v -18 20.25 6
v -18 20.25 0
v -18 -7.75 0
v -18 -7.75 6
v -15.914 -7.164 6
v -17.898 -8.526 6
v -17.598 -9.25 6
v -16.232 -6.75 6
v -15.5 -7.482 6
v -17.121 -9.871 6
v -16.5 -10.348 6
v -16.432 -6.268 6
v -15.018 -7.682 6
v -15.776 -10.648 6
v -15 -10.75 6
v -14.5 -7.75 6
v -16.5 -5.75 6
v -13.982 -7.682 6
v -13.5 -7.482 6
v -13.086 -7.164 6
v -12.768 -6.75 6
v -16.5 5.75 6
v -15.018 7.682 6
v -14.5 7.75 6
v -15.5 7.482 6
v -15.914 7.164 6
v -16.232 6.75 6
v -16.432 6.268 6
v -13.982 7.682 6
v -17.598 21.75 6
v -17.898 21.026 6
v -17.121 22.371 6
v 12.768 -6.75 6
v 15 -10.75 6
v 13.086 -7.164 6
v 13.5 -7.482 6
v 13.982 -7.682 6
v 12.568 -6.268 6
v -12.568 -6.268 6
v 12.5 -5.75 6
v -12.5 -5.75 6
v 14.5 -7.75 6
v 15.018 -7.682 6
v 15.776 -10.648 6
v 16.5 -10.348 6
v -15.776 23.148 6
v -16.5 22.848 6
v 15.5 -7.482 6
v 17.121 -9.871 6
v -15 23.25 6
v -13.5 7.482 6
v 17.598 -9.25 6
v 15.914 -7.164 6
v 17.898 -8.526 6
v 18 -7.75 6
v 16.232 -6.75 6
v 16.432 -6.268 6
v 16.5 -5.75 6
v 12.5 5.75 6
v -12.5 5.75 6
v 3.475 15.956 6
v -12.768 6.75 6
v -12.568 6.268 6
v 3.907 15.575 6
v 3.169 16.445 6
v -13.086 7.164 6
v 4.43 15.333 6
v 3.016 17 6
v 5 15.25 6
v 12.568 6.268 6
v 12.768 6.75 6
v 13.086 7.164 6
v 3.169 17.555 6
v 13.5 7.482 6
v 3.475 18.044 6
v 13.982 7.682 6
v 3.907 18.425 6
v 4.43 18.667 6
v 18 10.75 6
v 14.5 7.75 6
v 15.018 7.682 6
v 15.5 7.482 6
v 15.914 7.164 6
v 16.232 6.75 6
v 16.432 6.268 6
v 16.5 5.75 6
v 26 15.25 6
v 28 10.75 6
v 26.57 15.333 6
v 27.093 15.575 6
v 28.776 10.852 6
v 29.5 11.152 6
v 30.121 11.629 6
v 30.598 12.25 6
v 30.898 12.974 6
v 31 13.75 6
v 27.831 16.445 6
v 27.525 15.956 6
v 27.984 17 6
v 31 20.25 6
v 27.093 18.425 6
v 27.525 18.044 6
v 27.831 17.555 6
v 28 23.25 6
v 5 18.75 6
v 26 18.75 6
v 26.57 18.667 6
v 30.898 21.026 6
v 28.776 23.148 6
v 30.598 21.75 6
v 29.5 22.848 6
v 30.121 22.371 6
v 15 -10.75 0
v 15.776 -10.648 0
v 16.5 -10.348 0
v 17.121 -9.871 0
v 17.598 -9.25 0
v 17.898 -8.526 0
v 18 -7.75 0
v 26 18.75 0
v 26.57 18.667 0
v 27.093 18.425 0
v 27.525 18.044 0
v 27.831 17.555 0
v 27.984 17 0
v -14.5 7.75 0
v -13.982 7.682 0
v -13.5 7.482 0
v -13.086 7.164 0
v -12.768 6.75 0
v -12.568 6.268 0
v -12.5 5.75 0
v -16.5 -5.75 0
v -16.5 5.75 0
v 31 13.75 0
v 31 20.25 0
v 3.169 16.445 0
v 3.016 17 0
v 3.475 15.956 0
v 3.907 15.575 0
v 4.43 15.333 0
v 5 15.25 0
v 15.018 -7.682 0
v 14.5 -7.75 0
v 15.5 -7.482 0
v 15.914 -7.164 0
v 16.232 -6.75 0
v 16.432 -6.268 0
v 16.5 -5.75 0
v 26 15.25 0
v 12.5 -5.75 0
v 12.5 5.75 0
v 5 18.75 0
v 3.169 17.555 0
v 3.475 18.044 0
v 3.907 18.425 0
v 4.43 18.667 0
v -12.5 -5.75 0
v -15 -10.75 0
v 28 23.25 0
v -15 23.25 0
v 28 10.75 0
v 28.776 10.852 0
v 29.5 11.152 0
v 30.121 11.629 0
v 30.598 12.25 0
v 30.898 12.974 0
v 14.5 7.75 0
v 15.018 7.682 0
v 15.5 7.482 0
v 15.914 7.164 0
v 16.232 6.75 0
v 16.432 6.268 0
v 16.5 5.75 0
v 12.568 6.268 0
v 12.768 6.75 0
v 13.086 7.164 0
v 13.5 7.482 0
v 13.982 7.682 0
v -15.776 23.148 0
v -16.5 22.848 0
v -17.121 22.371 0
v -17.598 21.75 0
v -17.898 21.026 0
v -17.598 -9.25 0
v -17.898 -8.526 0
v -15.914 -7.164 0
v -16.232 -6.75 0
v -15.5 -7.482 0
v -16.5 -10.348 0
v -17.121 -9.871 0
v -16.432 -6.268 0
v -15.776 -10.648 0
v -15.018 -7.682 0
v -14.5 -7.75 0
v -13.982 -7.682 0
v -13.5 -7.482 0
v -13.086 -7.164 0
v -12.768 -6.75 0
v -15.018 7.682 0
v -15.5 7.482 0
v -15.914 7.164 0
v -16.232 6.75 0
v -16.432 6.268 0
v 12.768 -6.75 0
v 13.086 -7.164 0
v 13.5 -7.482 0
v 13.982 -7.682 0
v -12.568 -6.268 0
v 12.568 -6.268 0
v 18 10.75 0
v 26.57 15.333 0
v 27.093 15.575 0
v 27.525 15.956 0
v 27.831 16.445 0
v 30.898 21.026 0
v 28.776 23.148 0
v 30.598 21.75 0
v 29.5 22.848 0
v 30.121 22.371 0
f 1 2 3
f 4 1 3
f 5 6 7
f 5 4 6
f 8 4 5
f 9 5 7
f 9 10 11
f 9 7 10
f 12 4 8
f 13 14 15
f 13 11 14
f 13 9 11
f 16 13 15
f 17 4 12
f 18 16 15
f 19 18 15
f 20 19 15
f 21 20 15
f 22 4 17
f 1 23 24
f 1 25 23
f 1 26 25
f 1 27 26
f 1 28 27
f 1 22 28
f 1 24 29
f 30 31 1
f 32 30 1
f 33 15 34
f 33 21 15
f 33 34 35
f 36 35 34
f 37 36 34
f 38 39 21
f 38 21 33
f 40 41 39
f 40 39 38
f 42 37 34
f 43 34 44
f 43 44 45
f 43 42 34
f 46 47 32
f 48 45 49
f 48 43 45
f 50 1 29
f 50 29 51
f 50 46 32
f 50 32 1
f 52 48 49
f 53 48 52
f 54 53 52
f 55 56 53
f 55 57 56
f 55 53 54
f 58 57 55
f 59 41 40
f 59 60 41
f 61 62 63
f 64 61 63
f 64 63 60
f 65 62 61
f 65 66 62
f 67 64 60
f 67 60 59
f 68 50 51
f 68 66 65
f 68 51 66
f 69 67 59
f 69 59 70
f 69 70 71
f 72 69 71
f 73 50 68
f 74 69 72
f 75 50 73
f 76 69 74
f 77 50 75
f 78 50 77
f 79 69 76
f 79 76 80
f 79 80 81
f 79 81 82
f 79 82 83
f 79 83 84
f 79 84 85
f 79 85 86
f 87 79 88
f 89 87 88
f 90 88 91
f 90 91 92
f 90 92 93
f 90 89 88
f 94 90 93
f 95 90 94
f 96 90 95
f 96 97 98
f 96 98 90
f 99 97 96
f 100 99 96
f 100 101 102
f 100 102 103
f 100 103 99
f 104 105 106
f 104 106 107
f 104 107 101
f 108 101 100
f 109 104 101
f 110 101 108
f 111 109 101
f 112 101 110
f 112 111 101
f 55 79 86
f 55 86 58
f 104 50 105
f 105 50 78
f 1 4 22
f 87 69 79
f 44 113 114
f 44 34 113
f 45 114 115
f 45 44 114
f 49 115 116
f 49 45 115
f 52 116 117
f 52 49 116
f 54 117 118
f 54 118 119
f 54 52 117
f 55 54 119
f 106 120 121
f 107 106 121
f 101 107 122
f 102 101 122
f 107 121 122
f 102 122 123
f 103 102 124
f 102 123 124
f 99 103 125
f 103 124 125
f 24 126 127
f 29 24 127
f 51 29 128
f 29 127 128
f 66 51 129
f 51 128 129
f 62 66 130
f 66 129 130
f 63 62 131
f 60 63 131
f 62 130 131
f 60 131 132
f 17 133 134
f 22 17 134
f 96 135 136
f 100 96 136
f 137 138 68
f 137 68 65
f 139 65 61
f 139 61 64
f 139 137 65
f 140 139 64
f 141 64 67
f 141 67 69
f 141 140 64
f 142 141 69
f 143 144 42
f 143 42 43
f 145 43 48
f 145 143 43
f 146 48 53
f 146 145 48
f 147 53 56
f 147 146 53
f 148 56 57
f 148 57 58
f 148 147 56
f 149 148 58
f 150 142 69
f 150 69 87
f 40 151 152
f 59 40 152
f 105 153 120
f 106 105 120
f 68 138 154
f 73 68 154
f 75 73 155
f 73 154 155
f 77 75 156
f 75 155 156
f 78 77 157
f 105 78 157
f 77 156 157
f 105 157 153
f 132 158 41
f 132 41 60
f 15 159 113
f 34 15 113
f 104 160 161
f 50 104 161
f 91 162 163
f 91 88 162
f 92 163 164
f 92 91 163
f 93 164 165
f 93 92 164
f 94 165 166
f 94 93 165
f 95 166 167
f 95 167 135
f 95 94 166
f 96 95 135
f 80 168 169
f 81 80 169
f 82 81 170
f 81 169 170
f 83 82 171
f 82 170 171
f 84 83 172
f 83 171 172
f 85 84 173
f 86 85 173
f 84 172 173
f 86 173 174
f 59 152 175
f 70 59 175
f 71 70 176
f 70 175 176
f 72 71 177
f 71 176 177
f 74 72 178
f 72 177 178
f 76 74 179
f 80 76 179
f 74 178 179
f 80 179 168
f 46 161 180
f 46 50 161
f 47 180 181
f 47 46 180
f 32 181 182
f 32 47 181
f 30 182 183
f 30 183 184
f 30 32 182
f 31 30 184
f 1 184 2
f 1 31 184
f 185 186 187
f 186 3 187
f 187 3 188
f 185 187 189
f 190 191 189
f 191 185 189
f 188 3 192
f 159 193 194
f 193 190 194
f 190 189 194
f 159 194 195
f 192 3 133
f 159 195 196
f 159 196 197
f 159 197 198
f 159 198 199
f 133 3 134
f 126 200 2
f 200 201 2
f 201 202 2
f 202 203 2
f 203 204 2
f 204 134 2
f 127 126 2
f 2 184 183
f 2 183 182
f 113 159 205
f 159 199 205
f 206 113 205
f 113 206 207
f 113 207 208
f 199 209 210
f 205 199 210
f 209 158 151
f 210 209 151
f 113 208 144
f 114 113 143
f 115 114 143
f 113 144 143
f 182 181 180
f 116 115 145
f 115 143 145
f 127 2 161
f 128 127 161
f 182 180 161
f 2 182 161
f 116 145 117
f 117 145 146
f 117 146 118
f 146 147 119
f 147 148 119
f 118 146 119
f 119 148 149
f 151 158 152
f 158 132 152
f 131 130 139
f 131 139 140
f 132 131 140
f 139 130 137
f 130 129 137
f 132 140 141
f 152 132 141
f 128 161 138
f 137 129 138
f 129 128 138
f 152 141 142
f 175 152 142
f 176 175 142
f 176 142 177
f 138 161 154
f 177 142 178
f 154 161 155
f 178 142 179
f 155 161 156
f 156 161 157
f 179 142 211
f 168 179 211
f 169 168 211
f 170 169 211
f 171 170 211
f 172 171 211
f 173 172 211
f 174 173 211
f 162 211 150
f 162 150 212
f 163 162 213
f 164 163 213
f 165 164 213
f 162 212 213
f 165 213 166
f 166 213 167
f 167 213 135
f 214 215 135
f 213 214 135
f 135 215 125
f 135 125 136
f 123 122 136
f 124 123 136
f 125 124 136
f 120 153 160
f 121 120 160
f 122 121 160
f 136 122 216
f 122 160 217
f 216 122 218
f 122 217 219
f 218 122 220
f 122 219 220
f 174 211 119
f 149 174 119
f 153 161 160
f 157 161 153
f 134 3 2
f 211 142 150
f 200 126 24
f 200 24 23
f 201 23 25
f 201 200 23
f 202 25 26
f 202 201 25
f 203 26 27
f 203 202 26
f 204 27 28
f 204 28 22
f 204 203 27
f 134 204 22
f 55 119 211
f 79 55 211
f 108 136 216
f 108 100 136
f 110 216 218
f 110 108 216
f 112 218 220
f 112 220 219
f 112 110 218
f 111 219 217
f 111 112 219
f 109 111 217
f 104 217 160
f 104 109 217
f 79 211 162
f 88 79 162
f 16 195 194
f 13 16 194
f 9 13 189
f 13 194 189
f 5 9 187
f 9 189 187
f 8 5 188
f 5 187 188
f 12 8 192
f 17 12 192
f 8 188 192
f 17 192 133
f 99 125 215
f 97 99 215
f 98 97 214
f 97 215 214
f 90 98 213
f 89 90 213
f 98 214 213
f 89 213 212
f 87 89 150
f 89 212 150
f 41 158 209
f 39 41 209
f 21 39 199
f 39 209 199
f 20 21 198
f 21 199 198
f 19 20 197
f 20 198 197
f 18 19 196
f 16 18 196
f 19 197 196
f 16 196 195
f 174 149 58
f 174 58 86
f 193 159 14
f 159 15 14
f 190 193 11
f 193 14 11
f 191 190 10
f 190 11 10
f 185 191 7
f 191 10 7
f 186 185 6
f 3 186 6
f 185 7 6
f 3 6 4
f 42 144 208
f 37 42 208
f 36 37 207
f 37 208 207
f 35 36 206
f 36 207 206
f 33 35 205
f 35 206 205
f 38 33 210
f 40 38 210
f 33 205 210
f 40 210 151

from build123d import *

# Parameters (mm, degrees)
F0_W        = 36
F0_H        = 21.5
F0_R        = 1.625
F0_W_2      = 4
F0_H_2      = 15.5
F0_W_3      = 25
F0_H_3      = 3.5
F1_DEPTH    = 6
F2_T1_DEPTH = 6
F3_R        = 3


# Not quite as in the source:
# - a fillet or chamfer that OpenCascade refuses, or shapes differently, is made with other operations: its cross-section is extruded or revolved along the edge and cut away or added


with BuildPart() as f1:
    # F0 (on Top) → F1 (new body)
    with BuildSketch(Plane.XY):
        Rectangle(F0_W, F0_H)
        with Locations((-4.0289468229, -6.686462095)):
            Circle(F0_R, mode=Mode.SUBTRACT)
        with Locations((4.0289468229, -6.686462095)):
            Circle(F0_R, mode=Mode.SUBTRACT)
        with Locations((-14.5, 0)):
            Rectangle(F0_W_2, F0_H_2, mode=Mode.SUBTRACT)
        with Locations((14.5, 0)):
            Rectangle(F0_W_2, F0_H_2, mode=Mode.SUBTRACT)
        Polygon((-18, 10.75), (18, 10.75), (31, 10.75), (31, 23.25), (-18, 23.25), align=None)
        with Locations((15.5, 17)):
            Rectangle(F0_W_3, F0_H_3, mode=Mode.SUBTRACT)
        with Locations((-4.0289468229, -6.686462095)):
            Circle(F0_R)
        with Locations((4.0289468229, -6.686462095)):
            Circle(F0_R)
    extrude(amount=F1_DEPTH)

    # F2: fillet of radius 2 on 12 edges, made by hand

    # F2_s2 → F2_t1 (join)
    with BuildSketch(Plane.XY):
        with BuildLine():
            ThreePointArc((3, 16.75), (3.5857864376, 18.1642135624), (5, 18.75))
            Line((5, 18.75), (3, 18.75))
            Line((3, 18.75), (3, 16.75))
        make_face()
        with BuildLine():
            ThreePointArc((26, 18.75), (27.4142135624, 18.1642135624), (28, 16.75))
            Line((28, 16.75), (28, 18.75))
            Line((28, 18.75), (26, 18.75))
        make_face()
        with BuildLine():
            ThreePointArc((28, 17.25), (27.4142135624, 15.8357864376), (26, 15.25))
            Line((26, 15.25), (28, 15.25))
            Line((28, 15.25), (28, 17.25))
        make_face()
        with BuildLine():
            ThreePointArc((3, 17.25), (3.5857864376, 15.8357864376), (5, 15.25))
            Line((5, 15.25), (3, 15.25))
            Line((3, 15.25), (3, 17.25))
        make_face()
        with BuildLine():
            ThreePointArc((-14.5, -7.75), (-15.9142135624, -7.1642135624), (-16.5, -5.75))
            Line((-16.5, -5.75), (-16.5, -7.75))
            Line((-16.5, -7.75), (-14.5, -7.75))
        make_face()
        with BuildLine():
            ThreePointArc((14.5, -7.75), (13.0857864376, -7.1642135624), (12.5, -5.75))
            Line((12.5, -5.75), (12.5, -7.75))
            Line((12.5, -7.75), (14.5, -7.75))
        make_face()
        with BuildLine():
            ThreePointArc((14.5, -7.75), (15.9142135624, -7.1642135624), (16.5, -5.75))
            Line((16.5, -5.75), (16.5, -7.75))
            Line((16.5, -7.75), (14.5, -7.75))
        make_face()
        with BuildLine():
            ThreePointArc((-12.5, -5.75), (-13.0857864376, -7.1642135624), (-14.5, -7.75))
            Line((-14.5, -7.75), (-12.5, -7.75))
            Line((-12.5, -7.75), (-12.5, -5.75))
        make_face()
        with BuildLine():
            ThreePointArc((-14.5, 7.75), (-13.0857864376, 7.1642135624), (-12.5, 5.75))
            Line((-12.5, 5.75), (-12.5, 7.75))
            Line((-12.5, 7.75), (-14.5, 7.75))
        make_face()
        with BuildLine():
            ThreePointArc((-14.5, 7.75), (-15.9142135624, 7.1642135624), (-16.5, 5.75))
            Line((-16.5, 5.75), (-16.5, 7.75))
            Line((-16.5, 7.75), (-14.5, 7.75))
        make_face()
        with BuildLine():
            ThreePointArc((12.5, 5.75), (13.0857864376, 7.1642135624), (14.5, 7.75))
            Line((14.5, 7.75), (12.5, 7.75))
            Line((12.5, 7.75), (12.5, 5.75))
        make_face()
        with BuildLine():
            ThreePointArc((14.5, 7.75), (15.9142135624, 7.1642135624), (16.5, 5.75))
            Line((16.5, 5.75), (16.5, 7.75))
            Line((16.5, 7.75), (14.5, 7.75))
        make_face()
    extrude(amount=F2_T1_DEPTH)

    # F3
    f3_edges = [f1.edges().sort_by_distance(p)[0] for p in [
        (31, 10.75, 3),
        (31, 23.25, 3),
        (-18, 23.25, 3),
        (-18, -10.75, 3),
        (18, -10.75, 3),
    ]]
    fillet(f3_edges, radius=F3_R)


solid = f1.part
